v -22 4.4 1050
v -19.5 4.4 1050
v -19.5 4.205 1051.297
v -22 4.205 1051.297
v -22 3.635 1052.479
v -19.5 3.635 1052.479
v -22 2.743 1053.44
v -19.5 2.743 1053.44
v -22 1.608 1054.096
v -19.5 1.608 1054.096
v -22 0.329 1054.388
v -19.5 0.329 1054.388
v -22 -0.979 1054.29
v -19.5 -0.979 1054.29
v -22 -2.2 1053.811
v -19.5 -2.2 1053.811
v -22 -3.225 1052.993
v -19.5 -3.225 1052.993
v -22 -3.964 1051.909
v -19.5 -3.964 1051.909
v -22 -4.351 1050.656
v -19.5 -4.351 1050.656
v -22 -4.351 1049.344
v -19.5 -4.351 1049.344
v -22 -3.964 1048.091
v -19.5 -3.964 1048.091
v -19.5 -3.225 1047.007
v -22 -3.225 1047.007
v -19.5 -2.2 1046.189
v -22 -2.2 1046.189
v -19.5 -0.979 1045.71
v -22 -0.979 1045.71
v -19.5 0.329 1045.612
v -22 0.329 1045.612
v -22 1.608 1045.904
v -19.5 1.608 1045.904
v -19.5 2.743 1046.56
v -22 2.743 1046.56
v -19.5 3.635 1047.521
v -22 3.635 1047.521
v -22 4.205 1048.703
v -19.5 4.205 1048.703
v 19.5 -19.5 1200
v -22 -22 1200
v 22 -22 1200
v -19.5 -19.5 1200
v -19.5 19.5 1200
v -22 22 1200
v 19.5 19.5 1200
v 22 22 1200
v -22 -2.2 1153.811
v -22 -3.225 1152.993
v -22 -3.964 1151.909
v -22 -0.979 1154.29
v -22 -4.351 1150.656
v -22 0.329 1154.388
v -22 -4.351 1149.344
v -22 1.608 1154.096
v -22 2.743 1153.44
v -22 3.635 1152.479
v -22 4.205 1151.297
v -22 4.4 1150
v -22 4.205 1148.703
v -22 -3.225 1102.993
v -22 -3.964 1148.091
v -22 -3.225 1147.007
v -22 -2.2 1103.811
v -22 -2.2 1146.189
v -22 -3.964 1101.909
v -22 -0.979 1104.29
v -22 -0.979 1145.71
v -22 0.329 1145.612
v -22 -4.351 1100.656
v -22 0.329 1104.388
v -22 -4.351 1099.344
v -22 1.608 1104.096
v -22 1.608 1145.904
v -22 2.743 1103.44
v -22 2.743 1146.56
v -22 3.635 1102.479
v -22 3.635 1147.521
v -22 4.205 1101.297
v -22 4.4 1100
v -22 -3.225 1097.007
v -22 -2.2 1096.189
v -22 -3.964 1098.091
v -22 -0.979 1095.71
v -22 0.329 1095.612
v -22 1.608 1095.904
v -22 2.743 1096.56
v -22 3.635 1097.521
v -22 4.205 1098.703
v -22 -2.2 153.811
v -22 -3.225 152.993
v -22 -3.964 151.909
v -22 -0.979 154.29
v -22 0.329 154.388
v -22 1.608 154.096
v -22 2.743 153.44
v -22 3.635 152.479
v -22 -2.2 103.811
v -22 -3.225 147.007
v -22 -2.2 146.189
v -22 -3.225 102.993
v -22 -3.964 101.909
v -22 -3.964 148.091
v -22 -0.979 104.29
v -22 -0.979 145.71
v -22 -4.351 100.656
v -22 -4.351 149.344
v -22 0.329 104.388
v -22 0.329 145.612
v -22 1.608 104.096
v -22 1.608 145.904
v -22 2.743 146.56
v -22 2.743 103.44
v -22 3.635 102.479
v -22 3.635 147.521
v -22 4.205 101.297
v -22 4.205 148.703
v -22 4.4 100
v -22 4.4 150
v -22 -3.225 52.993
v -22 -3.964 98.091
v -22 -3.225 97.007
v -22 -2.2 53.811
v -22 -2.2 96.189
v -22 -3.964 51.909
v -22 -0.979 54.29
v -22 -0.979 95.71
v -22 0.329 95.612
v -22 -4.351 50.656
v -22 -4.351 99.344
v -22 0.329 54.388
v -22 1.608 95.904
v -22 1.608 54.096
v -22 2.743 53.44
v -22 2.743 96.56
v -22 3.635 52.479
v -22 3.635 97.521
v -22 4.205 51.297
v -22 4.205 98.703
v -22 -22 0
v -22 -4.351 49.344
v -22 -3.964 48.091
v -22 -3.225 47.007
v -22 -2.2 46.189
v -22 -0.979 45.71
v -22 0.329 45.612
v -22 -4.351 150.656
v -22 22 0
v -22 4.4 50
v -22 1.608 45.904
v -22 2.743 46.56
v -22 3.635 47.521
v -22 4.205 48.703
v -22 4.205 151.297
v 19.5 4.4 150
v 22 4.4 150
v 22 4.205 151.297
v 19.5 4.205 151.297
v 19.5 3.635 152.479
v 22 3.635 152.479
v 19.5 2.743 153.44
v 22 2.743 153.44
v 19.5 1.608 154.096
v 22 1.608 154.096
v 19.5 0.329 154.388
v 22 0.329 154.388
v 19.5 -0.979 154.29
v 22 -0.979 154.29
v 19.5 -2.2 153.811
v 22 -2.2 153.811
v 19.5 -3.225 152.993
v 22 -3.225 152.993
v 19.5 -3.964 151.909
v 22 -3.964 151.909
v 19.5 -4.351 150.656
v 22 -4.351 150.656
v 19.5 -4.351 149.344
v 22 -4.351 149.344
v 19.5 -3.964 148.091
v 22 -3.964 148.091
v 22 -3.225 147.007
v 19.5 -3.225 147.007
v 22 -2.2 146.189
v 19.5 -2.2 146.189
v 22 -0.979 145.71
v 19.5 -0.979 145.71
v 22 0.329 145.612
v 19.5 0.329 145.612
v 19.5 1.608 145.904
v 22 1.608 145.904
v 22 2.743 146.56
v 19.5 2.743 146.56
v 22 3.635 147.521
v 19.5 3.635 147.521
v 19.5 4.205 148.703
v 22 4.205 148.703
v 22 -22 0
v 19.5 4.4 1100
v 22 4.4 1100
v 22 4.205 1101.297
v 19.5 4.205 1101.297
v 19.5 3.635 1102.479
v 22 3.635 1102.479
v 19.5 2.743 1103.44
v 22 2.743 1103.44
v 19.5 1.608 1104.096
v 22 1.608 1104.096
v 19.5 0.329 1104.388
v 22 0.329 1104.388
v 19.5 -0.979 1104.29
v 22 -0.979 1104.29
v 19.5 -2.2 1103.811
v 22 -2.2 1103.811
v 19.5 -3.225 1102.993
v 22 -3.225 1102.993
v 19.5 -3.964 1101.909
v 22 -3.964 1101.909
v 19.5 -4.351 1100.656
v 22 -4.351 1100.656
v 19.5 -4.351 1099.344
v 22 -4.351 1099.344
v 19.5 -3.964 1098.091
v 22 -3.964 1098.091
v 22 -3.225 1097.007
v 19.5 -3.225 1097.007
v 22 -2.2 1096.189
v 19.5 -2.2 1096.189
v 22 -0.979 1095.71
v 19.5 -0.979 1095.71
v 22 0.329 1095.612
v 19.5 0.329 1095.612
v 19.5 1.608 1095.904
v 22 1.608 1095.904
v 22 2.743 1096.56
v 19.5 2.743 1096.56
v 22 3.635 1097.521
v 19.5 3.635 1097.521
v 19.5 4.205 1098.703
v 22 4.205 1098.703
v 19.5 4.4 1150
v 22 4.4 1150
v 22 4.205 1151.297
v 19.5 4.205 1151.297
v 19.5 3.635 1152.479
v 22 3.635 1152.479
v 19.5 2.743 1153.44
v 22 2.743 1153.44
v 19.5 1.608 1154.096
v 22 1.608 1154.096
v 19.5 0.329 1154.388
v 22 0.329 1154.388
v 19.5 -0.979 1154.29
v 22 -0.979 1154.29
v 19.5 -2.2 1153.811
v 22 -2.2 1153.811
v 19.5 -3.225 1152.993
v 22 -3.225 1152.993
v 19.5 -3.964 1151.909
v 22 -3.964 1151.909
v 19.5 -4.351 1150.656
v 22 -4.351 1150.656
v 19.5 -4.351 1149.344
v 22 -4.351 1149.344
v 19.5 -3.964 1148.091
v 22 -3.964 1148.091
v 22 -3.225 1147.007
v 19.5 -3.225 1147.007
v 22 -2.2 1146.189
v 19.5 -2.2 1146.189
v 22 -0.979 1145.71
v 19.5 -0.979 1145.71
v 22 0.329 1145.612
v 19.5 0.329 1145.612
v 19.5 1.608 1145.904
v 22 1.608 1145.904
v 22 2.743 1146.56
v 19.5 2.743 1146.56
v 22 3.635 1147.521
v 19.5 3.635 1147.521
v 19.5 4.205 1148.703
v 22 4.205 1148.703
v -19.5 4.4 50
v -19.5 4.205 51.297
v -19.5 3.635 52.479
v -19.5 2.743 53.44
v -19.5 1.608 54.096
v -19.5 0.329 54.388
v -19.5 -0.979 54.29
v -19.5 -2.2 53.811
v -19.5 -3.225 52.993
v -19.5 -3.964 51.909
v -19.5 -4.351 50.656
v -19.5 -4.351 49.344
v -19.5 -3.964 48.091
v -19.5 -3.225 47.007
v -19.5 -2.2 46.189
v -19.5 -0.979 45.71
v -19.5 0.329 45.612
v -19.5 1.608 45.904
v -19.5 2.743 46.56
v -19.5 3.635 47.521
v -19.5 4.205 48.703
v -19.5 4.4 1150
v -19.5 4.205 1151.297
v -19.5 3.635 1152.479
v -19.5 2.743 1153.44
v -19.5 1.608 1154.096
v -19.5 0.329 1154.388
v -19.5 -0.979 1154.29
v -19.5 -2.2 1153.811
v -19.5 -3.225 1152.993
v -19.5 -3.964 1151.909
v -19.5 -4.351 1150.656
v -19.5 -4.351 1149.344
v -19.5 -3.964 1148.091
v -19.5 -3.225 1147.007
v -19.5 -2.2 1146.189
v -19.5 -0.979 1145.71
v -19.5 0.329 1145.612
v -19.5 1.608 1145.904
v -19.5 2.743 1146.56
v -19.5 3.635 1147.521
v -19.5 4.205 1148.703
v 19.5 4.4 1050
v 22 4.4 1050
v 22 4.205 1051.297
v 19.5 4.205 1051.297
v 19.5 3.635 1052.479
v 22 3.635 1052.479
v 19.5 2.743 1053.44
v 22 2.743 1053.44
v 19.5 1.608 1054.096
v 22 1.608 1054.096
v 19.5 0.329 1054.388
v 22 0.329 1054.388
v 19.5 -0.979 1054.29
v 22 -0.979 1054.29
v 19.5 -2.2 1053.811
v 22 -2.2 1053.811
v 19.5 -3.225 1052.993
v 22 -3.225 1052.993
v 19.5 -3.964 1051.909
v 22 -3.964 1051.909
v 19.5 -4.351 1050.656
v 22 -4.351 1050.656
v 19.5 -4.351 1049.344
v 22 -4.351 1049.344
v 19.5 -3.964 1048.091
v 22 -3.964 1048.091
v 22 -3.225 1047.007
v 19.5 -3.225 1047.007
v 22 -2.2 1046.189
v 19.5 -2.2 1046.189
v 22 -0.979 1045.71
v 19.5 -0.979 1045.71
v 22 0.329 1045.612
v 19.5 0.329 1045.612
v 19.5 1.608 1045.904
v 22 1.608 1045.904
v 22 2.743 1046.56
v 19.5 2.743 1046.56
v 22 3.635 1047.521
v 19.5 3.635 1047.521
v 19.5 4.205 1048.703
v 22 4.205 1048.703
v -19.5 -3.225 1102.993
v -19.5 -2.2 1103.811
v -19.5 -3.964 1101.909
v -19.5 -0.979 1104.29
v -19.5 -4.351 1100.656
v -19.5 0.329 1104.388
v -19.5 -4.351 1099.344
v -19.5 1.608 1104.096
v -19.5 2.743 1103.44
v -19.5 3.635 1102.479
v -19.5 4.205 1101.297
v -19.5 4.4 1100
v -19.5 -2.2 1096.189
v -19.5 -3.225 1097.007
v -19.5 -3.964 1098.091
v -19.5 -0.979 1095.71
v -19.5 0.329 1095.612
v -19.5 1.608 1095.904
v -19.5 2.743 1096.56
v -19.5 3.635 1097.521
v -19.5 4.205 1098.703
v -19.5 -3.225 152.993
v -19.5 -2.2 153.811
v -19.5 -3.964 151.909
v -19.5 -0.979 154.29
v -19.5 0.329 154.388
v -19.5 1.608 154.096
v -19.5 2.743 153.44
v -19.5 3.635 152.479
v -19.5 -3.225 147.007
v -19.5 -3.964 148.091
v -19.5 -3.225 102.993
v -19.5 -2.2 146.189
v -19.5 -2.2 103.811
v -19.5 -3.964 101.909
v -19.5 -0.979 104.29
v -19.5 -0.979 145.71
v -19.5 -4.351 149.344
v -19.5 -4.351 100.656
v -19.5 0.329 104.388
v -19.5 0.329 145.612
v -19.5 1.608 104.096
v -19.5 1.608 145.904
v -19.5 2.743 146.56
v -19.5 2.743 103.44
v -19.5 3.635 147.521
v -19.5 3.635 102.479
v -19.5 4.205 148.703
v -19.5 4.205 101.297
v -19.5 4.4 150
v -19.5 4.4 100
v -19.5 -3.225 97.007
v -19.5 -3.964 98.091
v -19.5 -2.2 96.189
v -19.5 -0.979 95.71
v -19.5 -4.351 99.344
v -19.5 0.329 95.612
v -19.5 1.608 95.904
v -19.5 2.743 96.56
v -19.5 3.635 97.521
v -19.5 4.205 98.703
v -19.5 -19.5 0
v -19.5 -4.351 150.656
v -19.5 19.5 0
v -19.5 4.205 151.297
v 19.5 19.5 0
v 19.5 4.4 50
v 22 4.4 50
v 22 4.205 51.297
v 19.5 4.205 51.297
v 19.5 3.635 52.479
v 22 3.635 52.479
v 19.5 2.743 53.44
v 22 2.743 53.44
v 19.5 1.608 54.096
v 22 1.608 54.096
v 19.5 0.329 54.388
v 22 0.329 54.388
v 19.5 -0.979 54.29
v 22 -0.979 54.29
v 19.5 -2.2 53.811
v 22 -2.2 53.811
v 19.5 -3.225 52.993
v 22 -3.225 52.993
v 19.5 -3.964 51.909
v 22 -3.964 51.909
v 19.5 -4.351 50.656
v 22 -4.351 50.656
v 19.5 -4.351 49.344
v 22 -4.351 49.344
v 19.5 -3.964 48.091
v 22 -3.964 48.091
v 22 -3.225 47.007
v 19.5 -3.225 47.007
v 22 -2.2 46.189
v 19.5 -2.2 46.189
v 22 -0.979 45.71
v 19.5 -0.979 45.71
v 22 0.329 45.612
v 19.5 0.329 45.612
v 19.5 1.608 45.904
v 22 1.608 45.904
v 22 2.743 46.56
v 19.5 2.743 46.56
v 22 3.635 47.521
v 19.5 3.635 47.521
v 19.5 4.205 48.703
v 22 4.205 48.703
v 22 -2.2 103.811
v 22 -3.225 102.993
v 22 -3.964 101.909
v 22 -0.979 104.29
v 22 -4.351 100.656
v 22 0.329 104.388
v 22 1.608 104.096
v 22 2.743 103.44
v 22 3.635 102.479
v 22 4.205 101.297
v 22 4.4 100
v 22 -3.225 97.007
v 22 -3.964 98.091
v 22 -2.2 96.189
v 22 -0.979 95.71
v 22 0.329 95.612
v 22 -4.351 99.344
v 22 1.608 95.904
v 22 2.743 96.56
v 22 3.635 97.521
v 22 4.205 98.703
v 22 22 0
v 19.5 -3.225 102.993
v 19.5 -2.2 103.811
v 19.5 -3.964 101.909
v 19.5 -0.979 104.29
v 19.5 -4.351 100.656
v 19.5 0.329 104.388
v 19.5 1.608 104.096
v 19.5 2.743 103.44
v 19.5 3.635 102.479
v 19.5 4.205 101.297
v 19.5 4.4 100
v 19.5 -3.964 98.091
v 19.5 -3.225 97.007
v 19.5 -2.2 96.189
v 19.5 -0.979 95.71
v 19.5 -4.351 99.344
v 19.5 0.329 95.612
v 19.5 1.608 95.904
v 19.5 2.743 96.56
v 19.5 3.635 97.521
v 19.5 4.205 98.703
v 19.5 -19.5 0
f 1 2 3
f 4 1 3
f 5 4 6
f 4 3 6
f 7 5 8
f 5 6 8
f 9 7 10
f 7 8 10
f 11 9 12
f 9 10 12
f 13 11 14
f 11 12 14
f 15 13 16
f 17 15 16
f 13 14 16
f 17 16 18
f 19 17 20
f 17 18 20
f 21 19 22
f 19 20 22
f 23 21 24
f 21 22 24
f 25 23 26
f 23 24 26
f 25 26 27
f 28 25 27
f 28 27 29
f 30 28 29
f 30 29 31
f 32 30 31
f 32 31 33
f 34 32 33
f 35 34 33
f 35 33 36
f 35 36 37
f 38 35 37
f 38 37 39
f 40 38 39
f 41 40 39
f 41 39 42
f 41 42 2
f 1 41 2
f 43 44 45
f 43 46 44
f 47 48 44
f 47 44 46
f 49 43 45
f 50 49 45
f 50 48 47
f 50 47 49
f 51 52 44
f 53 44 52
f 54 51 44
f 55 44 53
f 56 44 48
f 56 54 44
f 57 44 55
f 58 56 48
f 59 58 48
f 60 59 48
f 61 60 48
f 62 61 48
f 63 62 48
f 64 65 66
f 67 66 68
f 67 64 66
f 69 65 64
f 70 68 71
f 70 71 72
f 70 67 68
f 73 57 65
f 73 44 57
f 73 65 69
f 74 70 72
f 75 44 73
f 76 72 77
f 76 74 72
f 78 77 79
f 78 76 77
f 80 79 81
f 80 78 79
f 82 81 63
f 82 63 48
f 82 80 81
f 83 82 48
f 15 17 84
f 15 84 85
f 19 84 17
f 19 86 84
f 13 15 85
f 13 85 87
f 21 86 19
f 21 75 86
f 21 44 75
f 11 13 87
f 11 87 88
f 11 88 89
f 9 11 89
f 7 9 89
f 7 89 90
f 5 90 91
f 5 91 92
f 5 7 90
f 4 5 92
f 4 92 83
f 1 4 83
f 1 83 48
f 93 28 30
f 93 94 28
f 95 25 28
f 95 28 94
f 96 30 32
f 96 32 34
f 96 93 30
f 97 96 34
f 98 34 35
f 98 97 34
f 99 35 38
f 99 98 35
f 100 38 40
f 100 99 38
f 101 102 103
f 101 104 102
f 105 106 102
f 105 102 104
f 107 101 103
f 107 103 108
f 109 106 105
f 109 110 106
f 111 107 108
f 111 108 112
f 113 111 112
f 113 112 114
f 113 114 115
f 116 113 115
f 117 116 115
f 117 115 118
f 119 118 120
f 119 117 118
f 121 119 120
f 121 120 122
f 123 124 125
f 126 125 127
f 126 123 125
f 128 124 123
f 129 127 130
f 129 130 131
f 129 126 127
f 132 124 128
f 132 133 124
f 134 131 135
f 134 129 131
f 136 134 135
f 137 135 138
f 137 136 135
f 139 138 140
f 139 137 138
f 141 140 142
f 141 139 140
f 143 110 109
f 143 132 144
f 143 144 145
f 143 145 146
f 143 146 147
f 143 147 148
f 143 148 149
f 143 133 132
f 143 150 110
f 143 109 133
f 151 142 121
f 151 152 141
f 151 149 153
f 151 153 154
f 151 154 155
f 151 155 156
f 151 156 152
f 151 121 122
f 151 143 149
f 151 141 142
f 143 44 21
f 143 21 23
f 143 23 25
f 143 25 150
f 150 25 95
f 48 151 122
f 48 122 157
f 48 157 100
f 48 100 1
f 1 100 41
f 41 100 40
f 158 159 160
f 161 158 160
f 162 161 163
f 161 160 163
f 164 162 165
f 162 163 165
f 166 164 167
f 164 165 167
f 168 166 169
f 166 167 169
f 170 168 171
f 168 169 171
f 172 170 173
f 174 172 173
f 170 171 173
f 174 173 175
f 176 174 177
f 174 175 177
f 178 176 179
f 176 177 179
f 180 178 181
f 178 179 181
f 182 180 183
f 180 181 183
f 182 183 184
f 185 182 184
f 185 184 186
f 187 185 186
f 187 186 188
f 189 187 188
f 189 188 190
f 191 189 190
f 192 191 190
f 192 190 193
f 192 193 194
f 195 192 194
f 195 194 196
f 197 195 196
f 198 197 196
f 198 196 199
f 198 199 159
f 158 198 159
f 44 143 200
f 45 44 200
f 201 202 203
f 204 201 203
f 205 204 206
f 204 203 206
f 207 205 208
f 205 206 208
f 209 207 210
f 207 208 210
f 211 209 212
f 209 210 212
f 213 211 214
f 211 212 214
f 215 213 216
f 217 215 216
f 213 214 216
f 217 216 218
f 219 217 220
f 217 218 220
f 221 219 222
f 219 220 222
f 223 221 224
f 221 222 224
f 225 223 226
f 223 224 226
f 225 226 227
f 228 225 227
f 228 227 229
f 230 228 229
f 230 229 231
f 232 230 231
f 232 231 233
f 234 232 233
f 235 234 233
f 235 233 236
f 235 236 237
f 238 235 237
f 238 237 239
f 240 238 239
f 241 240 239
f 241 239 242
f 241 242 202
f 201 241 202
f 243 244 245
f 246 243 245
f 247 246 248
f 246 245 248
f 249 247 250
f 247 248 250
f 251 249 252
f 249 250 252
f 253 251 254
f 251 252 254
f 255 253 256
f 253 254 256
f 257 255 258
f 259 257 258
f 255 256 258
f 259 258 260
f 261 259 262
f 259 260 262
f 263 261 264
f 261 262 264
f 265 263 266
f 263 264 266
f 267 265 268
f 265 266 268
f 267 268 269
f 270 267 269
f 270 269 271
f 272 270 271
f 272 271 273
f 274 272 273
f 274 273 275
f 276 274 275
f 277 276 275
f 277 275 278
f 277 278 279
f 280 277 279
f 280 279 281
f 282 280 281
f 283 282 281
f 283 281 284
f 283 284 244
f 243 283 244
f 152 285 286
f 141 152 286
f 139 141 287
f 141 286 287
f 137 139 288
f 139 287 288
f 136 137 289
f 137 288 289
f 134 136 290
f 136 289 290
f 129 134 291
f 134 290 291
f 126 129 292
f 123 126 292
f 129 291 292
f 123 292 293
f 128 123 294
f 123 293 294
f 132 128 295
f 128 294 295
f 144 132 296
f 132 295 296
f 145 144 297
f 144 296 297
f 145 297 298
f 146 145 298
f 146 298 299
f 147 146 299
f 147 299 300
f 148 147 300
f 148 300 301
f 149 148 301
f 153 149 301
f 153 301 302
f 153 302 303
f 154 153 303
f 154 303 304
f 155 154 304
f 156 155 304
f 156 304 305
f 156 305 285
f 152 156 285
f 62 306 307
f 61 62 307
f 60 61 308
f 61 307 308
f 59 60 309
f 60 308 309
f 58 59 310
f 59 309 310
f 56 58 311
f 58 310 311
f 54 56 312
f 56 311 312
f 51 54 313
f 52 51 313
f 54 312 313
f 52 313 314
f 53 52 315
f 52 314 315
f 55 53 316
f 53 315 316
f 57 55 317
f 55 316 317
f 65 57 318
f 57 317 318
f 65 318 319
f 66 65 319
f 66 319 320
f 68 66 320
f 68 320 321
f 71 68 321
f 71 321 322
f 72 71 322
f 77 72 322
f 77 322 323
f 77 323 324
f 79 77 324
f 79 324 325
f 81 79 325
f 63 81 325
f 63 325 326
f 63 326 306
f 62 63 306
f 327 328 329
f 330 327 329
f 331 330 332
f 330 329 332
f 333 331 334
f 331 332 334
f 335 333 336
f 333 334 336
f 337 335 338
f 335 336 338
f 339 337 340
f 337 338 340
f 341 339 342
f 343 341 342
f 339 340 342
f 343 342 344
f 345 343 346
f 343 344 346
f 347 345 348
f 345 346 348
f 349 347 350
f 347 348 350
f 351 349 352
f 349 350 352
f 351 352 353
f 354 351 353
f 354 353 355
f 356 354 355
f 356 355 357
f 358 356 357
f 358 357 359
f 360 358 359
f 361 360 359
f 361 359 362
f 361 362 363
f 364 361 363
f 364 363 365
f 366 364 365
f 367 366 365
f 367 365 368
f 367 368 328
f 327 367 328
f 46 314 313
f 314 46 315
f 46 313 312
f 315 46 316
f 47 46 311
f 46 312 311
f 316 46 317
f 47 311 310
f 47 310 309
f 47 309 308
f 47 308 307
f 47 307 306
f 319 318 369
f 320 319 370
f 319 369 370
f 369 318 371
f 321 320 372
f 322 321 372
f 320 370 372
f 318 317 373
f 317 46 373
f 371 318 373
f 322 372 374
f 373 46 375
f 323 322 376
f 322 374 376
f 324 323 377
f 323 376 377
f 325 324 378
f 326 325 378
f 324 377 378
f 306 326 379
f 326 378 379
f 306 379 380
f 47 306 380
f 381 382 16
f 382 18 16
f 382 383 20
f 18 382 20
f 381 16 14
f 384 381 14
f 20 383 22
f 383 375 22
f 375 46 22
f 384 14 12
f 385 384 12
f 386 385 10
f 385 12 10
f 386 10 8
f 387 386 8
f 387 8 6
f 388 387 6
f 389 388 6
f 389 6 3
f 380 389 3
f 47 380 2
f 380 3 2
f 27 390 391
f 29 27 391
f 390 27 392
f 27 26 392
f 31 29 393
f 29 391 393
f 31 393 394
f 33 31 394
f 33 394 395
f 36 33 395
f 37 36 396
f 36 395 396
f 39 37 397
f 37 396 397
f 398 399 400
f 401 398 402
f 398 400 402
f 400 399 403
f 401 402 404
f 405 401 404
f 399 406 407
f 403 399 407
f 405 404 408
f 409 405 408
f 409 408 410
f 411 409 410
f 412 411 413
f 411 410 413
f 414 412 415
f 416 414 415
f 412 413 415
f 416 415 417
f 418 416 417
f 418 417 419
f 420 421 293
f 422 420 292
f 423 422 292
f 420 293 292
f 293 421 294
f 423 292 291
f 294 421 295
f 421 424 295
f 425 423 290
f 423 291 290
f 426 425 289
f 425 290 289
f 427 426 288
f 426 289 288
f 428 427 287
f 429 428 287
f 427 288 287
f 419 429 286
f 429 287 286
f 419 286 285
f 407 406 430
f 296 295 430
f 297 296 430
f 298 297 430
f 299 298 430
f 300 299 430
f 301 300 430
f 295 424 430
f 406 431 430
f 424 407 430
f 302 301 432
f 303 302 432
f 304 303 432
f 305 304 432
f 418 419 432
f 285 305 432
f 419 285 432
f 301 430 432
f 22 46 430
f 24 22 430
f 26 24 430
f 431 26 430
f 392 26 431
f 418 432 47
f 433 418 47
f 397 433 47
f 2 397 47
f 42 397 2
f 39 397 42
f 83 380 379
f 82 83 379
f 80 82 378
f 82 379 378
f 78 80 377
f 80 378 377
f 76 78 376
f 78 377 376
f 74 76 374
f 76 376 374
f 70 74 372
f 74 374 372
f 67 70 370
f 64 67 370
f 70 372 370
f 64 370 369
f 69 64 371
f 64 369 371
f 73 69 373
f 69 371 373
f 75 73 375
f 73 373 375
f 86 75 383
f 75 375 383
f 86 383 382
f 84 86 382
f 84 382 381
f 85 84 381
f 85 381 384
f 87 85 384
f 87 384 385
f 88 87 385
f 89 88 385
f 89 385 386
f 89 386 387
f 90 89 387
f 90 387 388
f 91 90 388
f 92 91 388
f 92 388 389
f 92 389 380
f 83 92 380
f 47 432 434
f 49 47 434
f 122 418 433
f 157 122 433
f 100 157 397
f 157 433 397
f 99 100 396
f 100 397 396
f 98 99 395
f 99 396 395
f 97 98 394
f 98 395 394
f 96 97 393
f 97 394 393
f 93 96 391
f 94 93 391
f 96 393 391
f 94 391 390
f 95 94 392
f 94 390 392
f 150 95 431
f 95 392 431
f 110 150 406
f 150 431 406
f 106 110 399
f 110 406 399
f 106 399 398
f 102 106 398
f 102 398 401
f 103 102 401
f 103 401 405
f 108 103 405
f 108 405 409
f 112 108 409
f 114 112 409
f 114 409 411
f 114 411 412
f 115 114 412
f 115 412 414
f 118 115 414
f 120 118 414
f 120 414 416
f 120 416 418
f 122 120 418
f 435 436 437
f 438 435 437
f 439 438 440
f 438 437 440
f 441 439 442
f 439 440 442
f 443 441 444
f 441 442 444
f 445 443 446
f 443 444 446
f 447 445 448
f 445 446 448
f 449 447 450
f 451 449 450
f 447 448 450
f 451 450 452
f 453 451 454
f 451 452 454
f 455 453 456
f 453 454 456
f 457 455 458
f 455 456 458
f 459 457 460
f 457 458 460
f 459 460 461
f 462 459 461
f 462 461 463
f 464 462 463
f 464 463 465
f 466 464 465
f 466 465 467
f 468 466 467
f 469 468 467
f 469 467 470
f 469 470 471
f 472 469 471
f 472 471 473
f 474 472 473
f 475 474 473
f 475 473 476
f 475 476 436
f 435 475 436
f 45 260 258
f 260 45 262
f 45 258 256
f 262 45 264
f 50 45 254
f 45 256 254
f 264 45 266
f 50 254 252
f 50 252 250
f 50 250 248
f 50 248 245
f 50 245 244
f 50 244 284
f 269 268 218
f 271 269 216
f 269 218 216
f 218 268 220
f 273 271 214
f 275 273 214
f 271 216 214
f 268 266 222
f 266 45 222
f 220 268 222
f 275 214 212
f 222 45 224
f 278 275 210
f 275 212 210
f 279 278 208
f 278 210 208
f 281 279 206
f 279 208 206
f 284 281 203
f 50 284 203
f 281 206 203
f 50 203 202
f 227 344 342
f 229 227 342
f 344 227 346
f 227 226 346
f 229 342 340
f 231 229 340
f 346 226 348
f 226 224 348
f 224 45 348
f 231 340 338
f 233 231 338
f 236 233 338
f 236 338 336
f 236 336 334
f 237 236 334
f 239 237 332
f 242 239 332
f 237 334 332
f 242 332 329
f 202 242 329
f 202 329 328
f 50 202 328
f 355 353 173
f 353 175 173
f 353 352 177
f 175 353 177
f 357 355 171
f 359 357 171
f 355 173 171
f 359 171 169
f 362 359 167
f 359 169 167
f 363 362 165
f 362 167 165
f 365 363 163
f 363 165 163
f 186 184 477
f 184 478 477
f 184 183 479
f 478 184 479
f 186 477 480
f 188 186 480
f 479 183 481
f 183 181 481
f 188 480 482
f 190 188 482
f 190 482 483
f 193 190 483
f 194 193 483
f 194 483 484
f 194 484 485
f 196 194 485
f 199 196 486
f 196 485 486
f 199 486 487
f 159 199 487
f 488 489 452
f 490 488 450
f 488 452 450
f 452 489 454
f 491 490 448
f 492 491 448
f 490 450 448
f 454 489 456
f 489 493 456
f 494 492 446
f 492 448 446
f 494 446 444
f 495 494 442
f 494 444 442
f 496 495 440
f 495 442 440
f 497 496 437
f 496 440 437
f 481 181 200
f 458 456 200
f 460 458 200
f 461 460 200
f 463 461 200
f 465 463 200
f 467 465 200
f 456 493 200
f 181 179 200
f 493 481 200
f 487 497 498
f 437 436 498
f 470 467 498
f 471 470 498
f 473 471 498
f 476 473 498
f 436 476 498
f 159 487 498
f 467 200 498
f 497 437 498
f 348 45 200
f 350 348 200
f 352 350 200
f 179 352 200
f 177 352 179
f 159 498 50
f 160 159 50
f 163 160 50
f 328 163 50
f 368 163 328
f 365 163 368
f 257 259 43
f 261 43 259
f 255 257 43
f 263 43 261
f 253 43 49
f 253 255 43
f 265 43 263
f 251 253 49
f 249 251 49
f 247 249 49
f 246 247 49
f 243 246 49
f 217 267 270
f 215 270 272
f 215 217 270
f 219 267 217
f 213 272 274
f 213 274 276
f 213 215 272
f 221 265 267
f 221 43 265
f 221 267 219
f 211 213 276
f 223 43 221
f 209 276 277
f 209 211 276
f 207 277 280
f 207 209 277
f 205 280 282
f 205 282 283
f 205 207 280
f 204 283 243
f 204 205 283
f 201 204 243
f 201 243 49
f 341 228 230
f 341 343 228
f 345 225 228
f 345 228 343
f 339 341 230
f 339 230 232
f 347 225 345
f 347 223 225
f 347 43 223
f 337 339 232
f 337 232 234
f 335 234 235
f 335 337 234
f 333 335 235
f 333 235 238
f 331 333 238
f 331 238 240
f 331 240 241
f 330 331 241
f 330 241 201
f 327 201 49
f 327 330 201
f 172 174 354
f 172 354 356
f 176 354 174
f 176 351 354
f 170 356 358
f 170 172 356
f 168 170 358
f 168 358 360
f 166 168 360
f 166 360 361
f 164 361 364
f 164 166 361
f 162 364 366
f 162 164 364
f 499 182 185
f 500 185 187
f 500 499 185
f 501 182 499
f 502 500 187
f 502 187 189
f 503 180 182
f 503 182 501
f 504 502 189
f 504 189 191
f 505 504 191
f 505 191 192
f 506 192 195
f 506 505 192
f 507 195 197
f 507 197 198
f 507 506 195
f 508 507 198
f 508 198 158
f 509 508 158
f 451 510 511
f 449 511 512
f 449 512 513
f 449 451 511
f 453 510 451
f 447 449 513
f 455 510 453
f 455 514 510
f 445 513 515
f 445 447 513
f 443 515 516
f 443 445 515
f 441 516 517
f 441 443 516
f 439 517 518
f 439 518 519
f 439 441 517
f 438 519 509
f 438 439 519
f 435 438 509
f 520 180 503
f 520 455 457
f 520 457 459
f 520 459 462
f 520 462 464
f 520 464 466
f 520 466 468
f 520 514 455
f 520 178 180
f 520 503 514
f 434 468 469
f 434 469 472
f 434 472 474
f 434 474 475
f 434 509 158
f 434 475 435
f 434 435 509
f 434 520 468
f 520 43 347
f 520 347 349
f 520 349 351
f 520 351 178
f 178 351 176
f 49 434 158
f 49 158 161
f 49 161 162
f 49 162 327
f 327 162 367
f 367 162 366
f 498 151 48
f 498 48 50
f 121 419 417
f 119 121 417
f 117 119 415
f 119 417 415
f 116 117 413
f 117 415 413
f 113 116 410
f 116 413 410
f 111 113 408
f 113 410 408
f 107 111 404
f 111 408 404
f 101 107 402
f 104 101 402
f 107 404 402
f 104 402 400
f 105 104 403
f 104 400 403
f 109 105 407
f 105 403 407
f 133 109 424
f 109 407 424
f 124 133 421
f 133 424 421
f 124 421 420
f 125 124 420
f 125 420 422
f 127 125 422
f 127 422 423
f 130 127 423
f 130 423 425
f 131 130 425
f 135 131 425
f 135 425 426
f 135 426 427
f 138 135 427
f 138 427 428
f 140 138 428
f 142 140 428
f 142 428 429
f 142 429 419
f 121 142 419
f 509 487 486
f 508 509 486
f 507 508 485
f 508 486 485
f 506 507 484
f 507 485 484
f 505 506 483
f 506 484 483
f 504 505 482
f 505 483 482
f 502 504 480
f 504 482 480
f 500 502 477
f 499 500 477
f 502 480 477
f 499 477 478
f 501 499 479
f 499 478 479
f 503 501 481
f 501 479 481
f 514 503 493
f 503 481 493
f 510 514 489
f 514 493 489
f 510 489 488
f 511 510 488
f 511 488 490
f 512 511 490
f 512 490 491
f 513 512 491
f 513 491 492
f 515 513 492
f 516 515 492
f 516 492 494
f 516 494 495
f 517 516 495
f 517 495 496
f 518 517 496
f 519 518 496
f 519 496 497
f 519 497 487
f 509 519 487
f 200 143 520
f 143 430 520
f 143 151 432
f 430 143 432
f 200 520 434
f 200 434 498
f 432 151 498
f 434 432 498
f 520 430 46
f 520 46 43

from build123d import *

# Parameters (mm, degrees)
F0_W     = 44
F0_H     = 44
F0_W_2   = 39
F0_H_2   = 39
F1_DEPTH = 1200
F3_D     = 8.8


# Not quite as in the source:
# - a feature names something its author has since deleted; it is built from what else it names


with BuildPart() as f1:
    # F0 (on Top) → F1 (new body)
    with BuildSketch(Plane.XY):
        Rectangle(F0_W, F0_H)
        Rectangle(F0_W_2, F0_H_2, mode=Mode.SUBTRACT)
    extrude(amount=F1_DEPTH)

    # F3 (through all)
    with Locations(Plane(origin=(-22, 0, 0), x_dir=(0, -1, 0), z_dir=(-1, 0, 0))):
        with Locations((0, 150), (0, 100), (0, 50), (0, 1050), (0, 1150), (0, 1100)):
            Hole(F3_D / 2)


solid = f1.part
